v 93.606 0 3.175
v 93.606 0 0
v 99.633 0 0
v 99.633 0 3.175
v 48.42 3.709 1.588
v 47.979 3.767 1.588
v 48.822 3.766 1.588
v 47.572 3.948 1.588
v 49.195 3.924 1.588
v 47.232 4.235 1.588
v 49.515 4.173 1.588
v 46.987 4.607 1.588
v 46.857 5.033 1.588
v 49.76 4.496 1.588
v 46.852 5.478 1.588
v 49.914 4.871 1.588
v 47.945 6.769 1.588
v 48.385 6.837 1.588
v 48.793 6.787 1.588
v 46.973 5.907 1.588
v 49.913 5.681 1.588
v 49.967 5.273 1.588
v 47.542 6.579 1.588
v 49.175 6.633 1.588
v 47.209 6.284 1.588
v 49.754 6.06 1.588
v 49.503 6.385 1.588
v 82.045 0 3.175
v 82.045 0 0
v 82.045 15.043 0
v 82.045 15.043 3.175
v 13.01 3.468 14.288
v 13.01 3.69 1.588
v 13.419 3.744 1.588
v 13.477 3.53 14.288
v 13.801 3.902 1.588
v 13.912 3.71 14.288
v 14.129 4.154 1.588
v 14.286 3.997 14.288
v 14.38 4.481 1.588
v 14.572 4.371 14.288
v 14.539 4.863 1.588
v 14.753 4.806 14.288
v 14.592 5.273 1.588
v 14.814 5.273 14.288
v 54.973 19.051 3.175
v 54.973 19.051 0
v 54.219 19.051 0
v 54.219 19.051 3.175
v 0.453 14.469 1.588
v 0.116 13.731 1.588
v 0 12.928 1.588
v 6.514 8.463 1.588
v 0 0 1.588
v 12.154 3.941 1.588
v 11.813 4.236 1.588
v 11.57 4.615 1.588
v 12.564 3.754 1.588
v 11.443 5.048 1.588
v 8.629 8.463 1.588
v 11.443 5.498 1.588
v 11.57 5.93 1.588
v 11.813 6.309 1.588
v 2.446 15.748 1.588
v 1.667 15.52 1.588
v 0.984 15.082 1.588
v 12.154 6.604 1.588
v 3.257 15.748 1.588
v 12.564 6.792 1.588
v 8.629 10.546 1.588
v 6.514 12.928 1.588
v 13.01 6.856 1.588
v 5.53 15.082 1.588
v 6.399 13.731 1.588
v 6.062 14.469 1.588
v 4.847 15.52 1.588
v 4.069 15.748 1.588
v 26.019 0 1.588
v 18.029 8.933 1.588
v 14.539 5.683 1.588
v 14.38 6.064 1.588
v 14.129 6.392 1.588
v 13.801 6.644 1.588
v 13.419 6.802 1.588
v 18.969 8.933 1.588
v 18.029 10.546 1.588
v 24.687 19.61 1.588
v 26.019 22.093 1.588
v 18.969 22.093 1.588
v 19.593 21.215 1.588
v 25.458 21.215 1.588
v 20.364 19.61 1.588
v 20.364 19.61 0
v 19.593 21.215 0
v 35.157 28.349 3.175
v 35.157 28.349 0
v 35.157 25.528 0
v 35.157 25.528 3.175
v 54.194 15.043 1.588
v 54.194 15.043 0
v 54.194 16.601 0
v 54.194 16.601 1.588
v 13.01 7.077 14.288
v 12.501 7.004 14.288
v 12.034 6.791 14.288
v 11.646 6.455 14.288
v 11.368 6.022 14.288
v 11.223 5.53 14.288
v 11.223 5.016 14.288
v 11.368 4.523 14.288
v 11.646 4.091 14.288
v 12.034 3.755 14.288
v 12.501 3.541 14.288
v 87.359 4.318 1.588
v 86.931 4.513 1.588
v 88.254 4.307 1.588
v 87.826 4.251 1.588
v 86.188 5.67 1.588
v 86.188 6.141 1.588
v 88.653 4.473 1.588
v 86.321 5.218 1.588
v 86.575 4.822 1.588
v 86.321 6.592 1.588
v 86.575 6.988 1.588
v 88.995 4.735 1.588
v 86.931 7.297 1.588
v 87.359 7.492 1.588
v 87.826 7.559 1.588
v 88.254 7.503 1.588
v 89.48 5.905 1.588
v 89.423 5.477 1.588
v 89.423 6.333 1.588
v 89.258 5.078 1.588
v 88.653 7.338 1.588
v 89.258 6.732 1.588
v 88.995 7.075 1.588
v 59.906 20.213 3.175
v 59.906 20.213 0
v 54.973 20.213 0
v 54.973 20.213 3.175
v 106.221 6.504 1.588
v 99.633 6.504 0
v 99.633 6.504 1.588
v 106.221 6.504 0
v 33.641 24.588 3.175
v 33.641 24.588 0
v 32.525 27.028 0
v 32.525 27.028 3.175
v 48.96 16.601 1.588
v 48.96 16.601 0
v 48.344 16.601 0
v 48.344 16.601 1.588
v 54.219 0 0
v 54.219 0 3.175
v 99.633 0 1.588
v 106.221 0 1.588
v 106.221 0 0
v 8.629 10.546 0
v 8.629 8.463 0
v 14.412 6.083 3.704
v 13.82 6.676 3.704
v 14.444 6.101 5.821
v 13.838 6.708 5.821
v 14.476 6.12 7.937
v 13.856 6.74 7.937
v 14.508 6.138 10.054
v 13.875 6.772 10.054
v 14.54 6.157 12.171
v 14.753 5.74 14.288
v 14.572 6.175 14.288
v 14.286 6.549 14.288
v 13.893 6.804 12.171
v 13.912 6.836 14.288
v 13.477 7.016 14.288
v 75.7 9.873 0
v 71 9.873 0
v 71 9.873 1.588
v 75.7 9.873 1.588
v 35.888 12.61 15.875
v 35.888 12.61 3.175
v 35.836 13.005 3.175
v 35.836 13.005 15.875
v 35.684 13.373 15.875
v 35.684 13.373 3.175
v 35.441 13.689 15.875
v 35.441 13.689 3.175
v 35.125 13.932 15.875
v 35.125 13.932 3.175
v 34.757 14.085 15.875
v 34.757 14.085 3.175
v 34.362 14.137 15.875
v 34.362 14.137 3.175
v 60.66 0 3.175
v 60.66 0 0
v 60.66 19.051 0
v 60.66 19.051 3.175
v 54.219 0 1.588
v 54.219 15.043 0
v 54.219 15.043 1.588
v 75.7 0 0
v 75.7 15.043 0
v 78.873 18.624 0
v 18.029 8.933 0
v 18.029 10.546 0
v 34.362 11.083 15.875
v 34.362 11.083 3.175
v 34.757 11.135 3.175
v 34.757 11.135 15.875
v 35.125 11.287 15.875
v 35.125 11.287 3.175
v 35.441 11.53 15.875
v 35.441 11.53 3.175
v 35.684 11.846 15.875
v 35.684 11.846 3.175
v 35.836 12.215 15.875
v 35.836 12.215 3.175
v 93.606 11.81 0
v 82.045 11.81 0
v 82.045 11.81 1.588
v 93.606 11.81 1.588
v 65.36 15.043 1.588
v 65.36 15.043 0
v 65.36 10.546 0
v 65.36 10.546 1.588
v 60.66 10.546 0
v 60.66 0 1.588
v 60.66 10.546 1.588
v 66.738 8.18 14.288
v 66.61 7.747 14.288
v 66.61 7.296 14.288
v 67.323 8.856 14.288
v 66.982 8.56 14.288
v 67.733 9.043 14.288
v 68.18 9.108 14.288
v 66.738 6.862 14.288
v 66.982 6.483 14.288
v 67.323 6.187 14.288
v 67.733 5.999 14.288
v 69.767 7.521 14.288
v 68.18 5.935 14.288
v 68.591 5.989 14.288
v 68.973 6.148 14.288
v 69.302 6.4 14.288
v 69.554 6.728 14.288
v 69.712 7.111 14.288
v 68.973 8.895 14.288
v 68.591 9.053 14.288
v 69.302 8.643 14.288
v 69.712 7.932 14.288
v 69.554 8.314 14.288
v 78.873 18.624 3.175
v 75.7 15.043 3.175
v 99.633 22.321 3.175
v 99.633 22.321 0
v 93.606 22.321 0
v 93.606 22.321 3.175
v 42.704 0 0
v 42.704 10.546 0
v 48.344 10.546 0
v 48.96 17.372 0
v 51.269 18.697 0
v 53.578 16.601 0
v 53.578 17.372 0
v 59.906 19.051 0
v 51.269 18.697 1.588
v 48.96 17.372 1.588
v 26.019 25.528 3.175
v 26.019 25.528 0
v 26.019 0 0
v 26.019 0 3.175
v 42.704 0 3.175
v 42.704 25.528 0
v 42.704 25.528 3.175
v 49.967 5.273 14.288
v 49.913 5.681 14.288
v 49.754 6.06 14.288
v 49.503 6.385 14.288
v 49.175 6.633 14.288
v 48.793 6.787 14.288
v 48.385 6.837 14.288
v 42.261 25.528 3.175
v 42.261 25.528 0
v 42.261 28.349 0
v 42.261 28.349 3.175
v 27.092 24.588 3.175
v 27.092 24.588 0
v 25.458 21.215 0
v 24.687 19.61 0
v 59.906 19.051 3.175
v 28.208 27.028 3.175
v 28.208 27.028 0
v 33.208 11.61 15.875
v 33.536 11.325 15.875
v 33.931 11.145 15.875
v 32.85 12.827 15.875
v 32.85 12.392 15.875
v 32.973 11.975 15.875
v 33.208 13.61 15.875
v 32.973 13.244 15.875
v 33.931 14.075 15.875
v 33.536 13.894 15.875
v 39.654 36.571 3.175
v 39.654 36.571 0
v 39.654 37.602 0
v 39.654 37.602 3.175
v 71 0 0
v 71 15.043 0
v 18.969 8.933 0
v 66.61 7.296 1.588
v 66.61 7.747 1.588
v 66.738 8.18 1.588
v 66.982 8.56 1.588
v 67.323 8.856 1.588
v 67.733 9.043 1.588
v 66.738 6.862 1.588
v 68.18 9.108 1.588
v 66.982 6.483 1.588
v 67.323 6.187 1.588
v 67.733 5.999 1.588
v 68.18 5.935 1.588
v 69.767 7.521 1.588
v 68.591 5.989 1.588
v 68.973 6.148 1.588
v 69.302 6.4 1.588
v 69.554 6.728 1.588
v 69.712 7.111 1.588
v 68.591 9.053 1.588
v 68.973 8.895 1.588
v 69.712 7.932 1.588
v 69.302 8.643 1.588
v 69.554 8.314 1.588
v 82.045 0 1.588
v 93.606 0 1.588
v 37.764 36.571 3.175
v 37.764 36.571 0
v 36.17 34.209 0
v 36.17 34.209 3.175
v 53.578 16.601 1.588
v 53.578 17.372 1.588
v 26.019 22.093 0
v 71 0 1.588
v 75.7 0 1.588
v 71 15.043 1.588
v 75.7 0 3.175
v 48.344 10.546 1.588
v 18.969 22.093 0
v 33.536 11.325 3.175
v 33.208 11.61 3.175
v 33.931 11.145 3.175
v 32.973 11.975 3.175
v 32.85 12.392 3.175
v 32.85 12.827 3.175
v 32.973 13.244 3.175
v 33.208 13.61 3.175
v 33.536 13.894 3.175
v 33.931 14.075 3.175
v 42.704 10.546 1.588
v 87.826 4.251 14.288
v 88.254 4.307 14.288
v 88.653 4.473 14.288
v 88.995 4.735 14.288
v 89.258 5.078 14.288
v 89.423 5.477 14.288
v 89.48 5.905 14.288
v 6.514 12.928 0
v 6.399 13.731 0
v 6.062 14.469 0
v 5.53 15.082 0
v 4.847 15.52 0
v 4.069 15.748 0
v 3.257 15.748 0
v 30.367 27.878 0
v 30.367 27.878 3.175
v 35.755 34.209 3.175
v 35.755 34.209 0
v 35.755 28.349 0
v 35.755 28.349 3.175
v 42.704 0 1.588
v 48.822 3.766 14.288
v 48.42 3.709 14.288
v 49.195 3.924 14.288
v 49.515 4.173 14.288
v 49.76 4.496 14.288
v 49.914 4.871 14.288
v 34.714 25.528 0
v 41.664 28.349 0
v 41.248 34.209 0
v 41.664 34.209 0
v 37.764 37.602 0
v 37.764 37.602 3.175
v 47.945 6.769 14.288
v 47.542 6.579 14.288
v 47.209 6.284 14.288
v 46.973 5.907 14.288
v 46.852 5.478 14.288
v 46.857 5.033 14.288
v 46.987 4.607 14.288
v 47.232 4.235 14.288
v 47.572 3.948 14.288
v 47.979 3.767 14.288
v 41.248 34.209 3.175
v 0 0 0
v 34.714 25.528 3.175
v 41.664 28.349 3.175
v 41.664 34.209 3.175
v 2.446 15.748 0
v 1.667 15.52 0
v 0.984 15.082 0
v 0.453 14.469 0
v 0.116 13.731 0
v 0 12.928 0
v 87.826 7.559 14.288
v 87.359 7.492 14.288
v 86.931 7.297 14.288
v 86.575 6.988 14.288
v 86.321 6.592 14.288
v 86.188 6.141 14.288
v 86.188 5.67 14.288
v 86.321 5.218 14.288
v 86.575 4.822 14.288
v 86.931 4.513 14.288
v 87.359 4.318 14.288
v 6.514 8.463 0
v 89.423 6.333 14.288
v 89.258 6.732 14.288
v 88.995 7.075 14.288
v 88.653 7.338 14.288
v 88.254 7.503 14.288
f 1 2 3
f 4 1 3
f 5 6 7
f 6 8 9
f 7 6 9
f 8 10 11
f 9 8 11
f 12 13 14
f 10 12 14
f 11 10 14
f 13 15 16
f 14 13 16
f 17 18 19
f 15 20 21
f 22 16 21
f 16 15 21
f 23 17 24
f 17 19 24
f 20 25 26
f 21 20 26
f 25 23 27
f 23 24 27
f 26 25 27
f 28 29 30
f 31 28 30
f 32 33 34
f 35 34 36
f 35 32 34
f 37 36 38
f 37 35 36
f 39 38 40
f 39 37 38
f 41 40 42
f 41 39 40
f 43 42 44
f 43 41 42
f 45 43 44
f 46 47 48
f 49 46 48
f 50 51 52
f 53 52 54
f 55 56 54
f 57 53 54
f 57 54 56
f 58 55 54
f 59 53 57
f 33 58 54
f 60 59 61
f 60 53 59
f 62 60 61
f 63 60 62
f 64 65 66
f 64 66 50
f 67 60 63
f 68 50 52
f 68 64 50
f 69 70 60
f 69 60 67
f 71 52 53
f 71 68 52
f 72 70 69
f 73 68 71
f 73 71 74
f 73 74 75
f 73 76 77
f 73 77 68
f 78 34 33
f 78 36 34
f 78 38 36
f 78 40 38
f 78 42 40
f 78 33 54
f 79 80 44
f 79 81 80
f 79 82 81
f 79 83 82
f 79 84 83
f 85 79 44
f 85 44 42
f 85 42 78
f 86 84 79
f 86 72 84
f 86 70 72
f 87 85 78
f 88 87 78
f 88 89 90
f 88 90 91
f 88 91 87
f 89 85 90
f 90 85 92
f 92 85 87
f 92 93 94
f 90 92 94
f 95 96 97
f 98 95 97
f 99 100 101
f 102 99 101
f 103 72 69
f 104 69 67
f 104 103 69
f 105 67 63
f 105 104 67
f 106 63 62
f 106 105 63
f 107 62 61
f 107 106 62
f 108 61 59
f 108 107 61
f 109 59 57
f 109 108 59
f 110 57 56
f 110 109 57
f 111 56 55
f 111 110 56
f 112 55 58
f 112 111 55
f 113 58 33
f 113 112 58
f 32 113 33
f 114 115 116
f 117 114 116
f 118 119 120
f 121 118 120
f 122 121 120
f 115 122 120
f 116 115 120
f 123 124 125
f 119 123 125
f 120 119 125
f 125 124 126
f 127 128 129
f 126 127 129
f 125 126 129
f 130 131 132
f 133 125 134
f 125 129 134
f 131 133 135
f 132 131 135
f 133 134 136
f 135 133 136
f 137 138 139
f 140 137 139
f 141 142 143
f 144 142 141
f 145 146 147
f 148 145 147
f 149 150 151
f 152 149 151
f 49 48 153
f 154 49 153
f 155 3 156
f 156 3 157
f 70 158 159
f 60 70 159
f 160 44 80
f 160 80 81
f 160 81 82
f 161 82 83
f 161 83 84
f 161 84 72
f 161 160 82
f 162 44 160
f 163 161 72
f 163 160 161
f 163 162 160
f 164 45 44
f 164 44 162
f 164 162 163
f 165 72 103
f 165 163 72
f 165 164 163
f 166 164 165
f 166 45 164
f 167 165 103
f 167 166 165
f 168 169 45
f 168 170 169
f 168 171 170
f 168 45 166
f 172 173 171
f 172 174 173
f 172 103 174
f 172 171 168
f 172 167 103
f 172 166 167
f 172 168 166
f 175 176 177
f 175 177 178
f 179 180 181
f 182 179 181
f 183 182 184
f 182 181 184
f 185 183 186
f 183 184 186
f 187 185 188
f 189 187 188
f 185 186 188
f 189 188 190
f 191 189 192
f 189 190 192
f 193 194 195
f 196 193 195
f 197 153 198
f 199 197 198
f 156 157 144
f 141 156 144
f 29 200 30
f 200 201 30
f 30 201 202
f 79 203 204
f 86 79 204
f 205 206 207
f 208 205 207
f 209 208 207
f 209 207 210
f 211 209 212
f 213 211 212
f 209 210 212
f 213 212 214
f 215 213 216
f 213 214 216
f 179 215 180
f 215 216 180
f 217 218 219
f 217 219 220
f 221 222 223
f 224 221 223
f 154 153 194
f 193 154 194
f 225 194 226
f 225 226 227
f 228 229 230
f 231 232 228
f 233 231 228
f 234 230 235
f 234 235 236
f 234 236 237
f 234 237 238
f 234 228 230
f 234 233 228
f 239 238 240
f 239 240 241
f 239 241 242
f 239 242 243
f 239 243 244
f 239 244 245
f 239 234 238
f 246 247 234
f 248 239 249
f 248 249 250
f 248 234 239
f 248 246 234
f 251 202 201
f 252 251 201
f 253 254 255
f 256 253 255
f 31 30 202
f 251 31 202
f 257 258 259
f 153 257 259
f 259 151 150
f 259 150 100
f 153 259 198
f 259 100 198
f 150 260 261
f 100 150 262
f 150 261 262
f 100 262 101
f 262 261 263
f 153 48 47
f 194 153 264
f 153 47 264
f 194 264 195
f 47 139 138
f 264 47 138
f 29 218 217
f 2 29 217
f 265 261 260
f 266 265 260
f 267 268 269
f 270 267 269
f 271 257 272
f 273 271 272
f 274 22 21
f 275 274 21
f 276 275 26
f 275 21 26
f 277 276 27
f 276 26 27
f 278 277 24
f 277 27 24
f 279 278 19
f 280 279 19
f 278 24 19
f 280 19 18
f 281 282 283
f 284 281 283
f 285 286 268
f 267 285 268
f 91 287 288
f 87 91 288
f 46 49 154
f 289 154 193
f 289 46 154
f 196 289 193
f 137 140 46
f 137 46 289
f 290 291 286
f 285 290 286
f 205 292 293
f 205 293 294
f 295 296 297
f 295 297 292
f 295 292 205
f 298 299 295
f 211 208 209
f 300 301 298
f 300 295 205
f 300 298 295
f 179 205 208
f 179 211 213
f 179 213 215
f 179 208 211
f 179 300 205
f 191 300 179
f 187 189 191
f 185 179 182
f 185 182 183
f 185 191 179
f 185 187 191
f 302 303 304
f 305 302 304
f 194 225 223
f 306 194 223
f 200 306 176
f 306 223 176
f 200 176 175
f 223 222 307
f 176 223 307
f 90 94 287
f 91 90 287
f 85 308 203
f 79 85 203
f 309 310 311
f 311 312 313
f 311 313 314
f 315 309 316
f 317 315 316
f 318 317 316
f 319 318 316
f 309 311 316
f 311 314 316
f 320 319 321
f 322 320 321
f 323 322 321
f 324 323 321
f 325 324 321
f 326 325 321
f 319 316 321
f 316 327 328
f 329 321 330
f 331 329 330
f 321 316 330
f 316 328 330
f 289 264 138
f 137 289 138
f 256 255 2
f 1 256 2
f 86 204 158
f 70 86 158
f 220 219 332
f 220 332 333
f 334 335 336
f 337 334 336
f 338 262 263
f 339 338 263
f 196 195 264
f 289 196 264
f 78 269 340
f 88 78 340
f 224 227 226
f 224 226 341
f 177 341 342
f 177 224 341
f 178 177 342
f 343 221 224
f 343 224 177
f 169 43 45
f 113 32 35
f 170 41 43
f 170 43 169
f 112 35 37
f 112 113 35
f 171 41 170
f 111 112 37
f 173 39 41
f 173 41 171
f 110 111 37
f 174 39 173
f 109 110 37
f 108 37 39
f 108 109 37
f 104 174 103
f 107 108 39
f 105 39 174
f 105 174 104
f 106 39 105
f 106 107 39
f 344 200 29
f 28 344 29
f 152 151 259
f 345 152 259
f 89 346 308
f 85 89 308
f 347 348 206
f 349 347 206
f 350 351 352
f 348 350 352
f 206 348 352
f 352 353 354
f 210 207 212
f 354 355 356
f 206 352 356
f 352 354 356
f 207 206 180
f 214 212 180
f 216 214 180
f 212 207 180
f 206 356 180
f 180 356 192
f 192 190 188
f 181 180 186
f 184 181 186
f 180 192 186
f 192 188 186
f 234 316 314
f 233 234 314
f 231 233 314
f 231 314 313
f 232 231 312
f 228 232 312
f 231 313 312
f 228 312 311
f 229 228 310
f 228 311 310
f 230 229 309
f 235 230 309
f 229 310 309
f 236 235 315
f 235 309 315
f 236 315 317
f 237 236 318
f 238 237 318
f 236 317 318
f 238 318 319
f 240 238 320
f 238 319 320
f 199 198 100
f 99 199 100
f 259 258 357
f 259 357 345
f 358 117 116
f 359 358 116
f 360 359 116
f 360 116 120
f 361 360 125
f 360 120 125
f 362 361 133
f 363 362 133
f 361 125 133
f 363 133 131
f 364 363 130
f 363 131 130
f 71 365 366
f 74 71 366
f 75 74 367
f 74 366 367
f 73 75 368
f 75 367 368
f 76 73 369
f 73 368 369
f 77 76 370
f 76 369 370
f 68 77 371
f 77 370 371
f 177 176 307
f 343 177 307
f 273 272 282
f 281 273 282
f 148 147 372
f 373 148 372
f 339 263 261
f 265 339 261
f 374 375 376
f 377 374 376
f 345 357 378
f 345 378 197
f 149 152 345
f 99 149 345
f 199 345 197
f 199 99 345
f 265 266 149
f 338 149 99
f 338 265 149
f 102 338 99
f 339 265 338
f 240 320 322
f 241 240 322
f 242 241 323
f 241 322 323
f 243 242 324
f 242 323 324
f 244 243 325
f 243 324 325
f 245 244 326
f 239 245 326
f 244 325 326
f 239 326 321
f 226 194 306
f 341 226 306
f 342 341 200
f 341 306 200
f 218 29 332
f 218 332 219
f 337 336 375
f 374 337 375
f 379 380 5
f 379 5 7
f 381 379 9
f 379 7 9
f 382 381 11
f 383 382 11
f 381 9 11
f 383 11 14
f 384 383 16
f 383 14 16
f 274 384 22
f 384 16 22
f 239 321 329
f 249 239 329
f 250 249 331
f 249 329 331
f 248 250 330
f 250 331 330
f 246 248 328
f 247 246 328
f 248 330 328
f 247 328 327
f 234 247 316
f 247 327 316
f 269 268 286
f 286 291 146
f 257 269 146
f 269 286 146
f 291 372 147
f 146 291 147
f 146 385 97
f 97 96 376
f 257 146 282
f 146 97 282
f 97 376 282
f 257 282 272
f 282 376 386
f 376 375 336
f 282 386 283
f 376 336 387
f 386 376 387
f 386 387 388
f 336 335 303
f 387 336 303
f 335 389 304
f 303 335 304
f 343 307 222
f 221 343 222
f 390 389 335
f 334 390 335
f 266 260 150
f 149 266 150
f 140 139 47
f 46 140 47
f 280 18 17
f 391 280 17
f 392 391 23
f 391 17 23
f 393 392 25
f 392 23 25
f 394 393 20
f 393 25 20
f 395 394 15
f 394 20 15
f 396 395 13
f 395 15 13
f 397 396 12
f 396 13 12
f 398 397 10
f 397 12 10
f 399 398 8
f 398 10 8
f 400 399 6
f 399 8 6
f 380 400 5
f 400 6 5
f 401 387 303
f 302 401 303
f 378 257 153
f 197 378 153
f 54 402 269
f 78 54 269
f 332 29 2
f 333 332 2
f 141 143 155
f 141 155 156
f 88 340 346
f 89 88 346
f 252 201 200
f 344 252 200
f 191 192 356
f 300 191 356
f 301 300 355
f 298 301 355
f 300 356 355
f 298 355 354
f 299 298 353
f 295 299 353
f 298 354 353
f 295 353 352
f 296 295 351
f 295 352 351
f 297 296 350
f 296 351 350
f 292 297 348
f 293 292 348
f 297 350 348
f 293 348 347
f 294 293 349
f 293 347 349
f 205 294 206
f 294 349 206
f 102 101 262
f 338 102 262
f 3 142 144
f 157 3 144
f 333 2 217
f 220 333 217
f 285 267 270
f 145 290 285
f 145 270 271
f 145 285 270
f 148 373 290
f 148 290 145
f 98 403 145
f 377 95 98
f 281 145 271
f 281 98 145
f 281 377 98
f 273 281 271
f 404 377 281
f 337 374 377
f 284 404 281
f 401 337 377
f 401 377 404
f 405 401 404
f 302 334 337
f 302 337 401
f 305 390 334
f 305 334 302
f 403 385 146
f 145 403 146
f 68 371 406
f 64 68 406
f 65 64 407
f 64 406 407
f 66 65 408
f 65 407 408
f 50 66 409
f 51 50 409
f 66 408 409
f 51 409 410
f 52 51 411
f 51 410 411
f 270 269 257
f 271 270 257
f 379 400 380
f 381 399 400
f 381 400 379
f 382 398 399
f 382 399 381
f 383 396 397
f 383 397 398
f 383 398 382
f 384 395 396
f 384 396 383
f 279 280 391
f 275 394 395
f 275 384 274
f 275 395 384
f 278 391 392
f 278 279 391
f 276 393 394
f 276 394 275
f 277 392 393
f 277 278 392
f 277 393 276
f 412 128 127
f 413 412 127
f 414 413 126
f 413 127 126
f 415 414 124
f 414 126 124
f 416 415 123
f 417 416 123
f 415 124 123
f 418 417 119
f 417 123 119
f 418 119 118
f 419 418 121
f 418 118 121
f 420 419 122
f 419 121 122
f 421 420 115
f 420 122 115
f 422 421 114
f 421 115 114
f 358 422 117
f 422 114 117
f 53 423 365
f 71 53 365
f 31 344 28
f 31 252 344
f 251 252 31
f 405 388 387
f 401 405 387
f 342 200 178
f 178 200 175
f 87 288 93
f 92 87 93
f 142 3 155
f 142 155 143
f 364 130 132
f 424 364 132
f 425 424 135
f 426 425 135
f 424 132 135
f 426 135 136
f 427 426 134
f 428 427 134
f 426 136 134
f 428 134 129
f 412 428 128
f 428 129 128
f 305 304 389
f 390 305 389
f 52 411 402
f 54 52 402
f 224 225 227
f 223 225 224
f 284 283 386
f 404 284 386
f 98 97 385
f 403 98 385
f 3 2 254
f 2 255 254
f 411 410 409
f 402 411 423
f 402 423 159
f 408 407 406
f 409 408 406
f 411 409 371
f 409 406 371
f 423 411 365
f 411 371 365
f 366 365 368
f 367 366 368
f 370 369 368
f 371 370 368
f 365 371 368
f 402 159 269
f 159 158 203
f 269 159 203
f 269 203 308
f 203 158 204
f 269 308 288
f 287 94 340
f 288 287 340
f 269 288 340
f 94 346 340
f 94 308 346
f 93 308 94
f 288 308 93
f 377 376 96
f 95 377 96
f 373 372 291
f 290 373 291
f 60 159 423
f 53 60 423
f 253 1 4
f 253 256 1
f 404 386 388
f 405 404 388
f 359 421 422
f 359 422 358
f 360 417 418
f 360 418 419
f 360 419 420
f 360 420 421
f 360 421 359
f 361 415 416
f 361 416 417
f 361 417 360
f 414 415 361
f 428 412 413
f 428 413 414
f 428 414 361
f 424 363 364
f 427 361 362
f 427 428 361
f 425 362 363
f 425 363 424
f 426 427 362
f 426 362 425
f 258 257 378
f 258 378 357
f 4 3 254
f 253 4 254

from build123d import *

# Parameters (mm, degrees)
F1_DEPTH = 3.175
F2_DEPTH = 1.5875
F0_W     = 5.639936775
F0_H     = 10.5457017198
F0_W_2   = 4.6999491751
F0_W_3   = 4.6999529004
F0_H_2   = 9.8727531731
F0_W_4   = 11.5607306361
F0_H_3   = 11.8103343993
F0_W_5   = 6.588049233
F0_H_4   = 6.5041691996
F8_DEPTH = 12.7
F8_TAPER = -1
F9_DEPTH = 12.7


with BuildPart() as f1:
    # F0 (on Top) → F1 (new body)
    with BuildSketch(Plane.XY):
        Polygon((34.7140654922, 25.5283378065), (34.7140654922, 0), (42.703974992, 0), (42.703974992, 10.5457017198), (42.703974992, 25.5283378065), (42.2610007226, 25.5283378065), (42.2610007226, 28.3491015434), (41.6635014117, 28.3491015434), (41.6635014117, 34.2090092599), (41.2480793893, 34.2090092599), (39.6537408233, 36.570508033), (39.6537408233, 37.602443248), (38.7090202421, 37.602443248), (37.7642996609, 37.602443248), (37.7642996609, 36.570508033), (36.1699610949, 34.2090092599), (35.7545390725, 34.2090092599), (35.7545390725, 28.3491015434), (35.1570397615, 28.3491015434), (35.1570397615, 25.5283378065), align=None)
        Polygon((26.0191634297, 22.0926180482), (26.0191634297, 0), (34.7140654922, 0), (34.7140654922, 25.5283378065), (33.641166985, 24.588348344), (32.5249303132, 27.027560398), (30.3666144609, 27.8783105314), (28.2082986087, 27.027560398), (27.0920619369, 24.588348344), (26.0191634297, 25.5283378065), align=None)
    extrude(amount=F1_DEPTH)


with BuildPart() as f1b:
    # F0 (on Top) → F1, piece 2 (new body)
    with BuildSketch(Plane.XY):
        Polygon((75.7002681494, 9.8727531731), (75.7002681494, 0), (82.0451974869, 0), (82.0451974869, 11.8103343993), (82.0451974869, 15.0426970795), (78.8727328181, 18.6240728945), (75.7002681494, 15.0426970795), align=None)
    extrude(amount=F1_DEPTH)


with BuildPart() as f1c:
    # F0 (on Top) → F1, piece 3 (new body)
    with BuildSketch(Plane.XY):
        Polygon((93.605928123, 11.8103343993), (93.605928123, 0), (99.6332839131, 0), (99.6332839131, 6.5041691996), (99.6332839131, 22.3209001124), (93.605928123, 22.3209001124), align=None)
    extrude(amount=F1_DEPTH)


with BuildPart() as f1d:
    # F0 (on Top) → F1, piece 4 (new body)
    with BuildSketch(Plane.XY):
        Polygon((54.2188473046, 15.0426970795), (54.2188473046, 0), (60.6604330242, 0), (60.6604330242, 10.5457017198), (60.6604330242, 15.0426970795), (60.6604330242, 19.051130861), (59.905834496, 19.051130861), (59.905834496, 20.2126391232), (54.9734458327, 20.2126391232), (54.9734458327, 19.051130861), (54.2188473046, 19.051130861), align=None)
    extrude(amount=F1_DEPTH)


with BuildPart() as f2:
    # F0 (on Top) → F2 (new body)
    with BuildSketch(Plane.XY):
        with BuildLine():
            Line((0, 12.9277203232), (0, 0))
            Line((0, 0), (5.3393961862, 0))
            Line((5.3393961862, 0), (6.514382083, 0))
            Line((6.514382083, 0), (8.6293583736, 0))
            Line((8.6293583736, 0), (16.6192688048, 0))
            Line((16.6192688048, 0), (18.0292539299, 0))
            Line((18.0292539299, 0), (18.9692433923, 0))
            Line((18.9692433923, 0), (26.0191634297, 0))
            Line((26.0191634297, 0), (26.0191634297, 22.0926180482))
            Line((26.0191634297, 22.0926180482), (18.9692433923, 22.0926180482))
            Line((18.9692433923, 22.0926180482), (18.9692433923, 8.9327655733))
            Line((18.9692433923, 8.9327655733), (18.0292539299, 8.9327655733))
            Line((18.0292539299, 8.9327655733), (18.0292539299, 10.5457017198))
            Line((18.0292539299, 10.5457017198), (8.6293583736, 10.5457017198))
            Line((8.6293583736, 10.5457017198), (8.6293583736, 8.4627699107))
            Line((8.6293583736, 8.4627699107), (6.514382083, 8.4627699107))
            Line((6.514382083, 8.4627699107), (6.514382083, 12.9277203232))
            ThreePointArc((6.514382083, 12.9277203232), (5.530064061, 15.0818741703), (3.2571910415, 15.7476887107))
            ThreePointArc((3.2571910415, 15.7476887107), (0.984318022, 15.0818741703), (0, 12.9277203232))
        make_face()
        Polygon((20.3642528504, 19.6101777256), (19.593283534, 21.2151966989), (25.4579409957, 21.2151966989), (24.6869716793, 19.6101777256), align=None, mode=Mode.SUBTRACT)
    extrude(amount=F2_DEPTH)

    # F3 (on face) → F8 (join)
    with BuildSketch(Plane.XY.offset(1.5875)):
        with BuildLine():
            ThreePointArc((13.0095817149, 6.8557492698), (11.426683305, 5.2728508599), (13.0095817149, 3.68995245))
            ThreePointArc((13.0095817149, 3.68995245), (14.1288599144, 4.1535726604), (14.5924801248, 5.2728508599))
            ThreePointArc((14.5924801248, 5.2728508599), (14.1288599144, 6.3921290595), (13.0095817149, 6.8557492698))
        make_face()
    extrude(amount=F8_DEPTH, taper=F8_TAPER)


with BuildPart() as f2b:
    # F0 (on Top) → F2, piece 2 (new body)
    with BuildSketch(Plane.XY):
        with Locations((45.5239433795, 5.2728508599)):
            Rectangle(F0_W, F0_H)
        Polygon((48.343911767, 10.5457017198), (48.343911767, 0), (54.2188473046, 0), (54.2188473046, 15.0426970795), (54.1941193212, 15.0426970795), (54.1941193212, 16.6012711681), (53.5775407698, 16.6012711681), (53.5775407698, 17.3716027477), (51.2690155441, 18.6972189695), (48.9604903184, 17.3716027477), (48.9604903184, 16.6012711681), (48.343911767, 16.6012711681), (48.343911767, 15.0426970795), align=None)
    extrude(amount=F2_DEPTH)


with BuildPart() as f2c:
    # F0 (on Top) → F2, piece 3 (new body)
    with BuildSketch(Plane.XY):
        Polygon((65.3603821993, 10.5457017198), (65.3603821993, 0), (71.000315249, 0), (71.000315249, 9.8727531731), (71.000315249, 15.0426970795), (65.3603821993, 15.0426970795), align=None)
        with Locations((63.0104076117, 5.2728508599)):
            Rectangle(F0_W_2, F0_H)
        with Locations((73.3502916992, 4.9363765866)):
            Rectangle(F0_W_3, F0_H_2)
    extrude(amount=F2_DEPTH)


with BuildPart() as f2d:
    # F0 (on Top) → F2, piece 4 (new body)
    with BuildSketch(Plane.XY):
        with Locations((87.8255628049, 5.9051671997)):
            Rectangle(F0_W_4, F0_H_3)
    extrude(amount=F2_DEPTH)


with BuildPart() as f2e:
    # F0 (on Top) → F2, piece 5 (new body)
    with BuildSketch(Plane.XY):
        with Locations((102.9273085296, 3.2520845998)):
            Rectangle(F0_W_5, F0_H_4)
    extrude(amount=F2_DEPTH)


with BuildPart() as f9:
    # F4 (on face) → F9 (new body)
    with BuildSketch(Plane.XY.offset(3.175)):
        with BuildLine():
            ThreePointArc((34.3615692109, 14.1366351541), (32.8346881725, 12.6097541157), (34.3615692109, 11.0828730774))
            ThreePointArc((34.3615692109, 11.0828730774), (35.4412371472, 11.5300861795), (35.8884502492, 12.6097541157))
            ThreePointArc((35.8884502492, 12.6097541157), (35.4412371472, 13.689422052), (34.3615692109, 14.1366351541))
        make_face()
    extrude(amount=F9_DEPTH)


with BuildPart() as f9b:
    # F5 (on face) → F9, piece 2 (new body)
    with BuildSketch(Plane.XY.offset(1.5875)):
        with BuildLine():
            ThreePointArc((48.3852341409, 6.8369721577), (46.8385401599, 5.2554235431), (48.4200887745, 3.7087295621))
            ThreePointArc((48.4200887745, 3.7087295621), (49.5148753028, 4.1729601798), (49.9668798393, 5.2728508599))
            ThreePointArc((49.9668798393, 5.2728508599), (49.5025521377, 6.3850647051), (48.3852341409, 6.8369721577))
        make_face()
    extrude(amount=F9_DEPTH)


with BuildPart() as f9c:
    # F6 (on face) → F9, piece 3 (new body)
    with BuildSketch(Plane.XY.offset(1.5875)):
        with BuildLine():
            ThreePointArc((68.1803487241, 9.1075093619), (66.5941879019, 7.5213485397), (68.1803487241, 5.9351877175))
            ThreePointArc((68.1803487241, 5.9351877175), (69.3019337976, 6.3997634663), (69.7665095463, 7.5213485397))
            ThreePointArc((69.7665095463, 7.5213485397), (69.3019337976, 8.6429336132), (68.1803487241, 9.1075093619))
        make_face()
    extrude(amount=F9_DEPTH)


with BuildPart() as f9d:
    # F7 (on face) → F9, piece 4 (new body)
    with BuildSketch(Plane.XY.offset(1.5875)):
        with BuildLine():
            ThreePointArc((87.8255628049, 7.5594574065), (86.1712725981, 5.9051671997), (87.8255628049, 4.2508769928))
            ThreePointArc((87.8255628049, 4.2508769928), (88.9953226282, 4.7354073764), (89.4798530118, 5.9051671997))
            ThreePointArc((89.4798530118, 5.9051671997), (88.9953226282, 7.074927023), (87.8255628049, 7.5594574065))
        make_face()
    extrude(amount=F9_DEPTH)


solid = Compound([f1.part, f1b.part, f1c.part, f1d.part, f2.part, f2b.part, f2c.part, f2d.part, f2e.part, f9.part, f9b.part, f9c.part, f9d.part])
